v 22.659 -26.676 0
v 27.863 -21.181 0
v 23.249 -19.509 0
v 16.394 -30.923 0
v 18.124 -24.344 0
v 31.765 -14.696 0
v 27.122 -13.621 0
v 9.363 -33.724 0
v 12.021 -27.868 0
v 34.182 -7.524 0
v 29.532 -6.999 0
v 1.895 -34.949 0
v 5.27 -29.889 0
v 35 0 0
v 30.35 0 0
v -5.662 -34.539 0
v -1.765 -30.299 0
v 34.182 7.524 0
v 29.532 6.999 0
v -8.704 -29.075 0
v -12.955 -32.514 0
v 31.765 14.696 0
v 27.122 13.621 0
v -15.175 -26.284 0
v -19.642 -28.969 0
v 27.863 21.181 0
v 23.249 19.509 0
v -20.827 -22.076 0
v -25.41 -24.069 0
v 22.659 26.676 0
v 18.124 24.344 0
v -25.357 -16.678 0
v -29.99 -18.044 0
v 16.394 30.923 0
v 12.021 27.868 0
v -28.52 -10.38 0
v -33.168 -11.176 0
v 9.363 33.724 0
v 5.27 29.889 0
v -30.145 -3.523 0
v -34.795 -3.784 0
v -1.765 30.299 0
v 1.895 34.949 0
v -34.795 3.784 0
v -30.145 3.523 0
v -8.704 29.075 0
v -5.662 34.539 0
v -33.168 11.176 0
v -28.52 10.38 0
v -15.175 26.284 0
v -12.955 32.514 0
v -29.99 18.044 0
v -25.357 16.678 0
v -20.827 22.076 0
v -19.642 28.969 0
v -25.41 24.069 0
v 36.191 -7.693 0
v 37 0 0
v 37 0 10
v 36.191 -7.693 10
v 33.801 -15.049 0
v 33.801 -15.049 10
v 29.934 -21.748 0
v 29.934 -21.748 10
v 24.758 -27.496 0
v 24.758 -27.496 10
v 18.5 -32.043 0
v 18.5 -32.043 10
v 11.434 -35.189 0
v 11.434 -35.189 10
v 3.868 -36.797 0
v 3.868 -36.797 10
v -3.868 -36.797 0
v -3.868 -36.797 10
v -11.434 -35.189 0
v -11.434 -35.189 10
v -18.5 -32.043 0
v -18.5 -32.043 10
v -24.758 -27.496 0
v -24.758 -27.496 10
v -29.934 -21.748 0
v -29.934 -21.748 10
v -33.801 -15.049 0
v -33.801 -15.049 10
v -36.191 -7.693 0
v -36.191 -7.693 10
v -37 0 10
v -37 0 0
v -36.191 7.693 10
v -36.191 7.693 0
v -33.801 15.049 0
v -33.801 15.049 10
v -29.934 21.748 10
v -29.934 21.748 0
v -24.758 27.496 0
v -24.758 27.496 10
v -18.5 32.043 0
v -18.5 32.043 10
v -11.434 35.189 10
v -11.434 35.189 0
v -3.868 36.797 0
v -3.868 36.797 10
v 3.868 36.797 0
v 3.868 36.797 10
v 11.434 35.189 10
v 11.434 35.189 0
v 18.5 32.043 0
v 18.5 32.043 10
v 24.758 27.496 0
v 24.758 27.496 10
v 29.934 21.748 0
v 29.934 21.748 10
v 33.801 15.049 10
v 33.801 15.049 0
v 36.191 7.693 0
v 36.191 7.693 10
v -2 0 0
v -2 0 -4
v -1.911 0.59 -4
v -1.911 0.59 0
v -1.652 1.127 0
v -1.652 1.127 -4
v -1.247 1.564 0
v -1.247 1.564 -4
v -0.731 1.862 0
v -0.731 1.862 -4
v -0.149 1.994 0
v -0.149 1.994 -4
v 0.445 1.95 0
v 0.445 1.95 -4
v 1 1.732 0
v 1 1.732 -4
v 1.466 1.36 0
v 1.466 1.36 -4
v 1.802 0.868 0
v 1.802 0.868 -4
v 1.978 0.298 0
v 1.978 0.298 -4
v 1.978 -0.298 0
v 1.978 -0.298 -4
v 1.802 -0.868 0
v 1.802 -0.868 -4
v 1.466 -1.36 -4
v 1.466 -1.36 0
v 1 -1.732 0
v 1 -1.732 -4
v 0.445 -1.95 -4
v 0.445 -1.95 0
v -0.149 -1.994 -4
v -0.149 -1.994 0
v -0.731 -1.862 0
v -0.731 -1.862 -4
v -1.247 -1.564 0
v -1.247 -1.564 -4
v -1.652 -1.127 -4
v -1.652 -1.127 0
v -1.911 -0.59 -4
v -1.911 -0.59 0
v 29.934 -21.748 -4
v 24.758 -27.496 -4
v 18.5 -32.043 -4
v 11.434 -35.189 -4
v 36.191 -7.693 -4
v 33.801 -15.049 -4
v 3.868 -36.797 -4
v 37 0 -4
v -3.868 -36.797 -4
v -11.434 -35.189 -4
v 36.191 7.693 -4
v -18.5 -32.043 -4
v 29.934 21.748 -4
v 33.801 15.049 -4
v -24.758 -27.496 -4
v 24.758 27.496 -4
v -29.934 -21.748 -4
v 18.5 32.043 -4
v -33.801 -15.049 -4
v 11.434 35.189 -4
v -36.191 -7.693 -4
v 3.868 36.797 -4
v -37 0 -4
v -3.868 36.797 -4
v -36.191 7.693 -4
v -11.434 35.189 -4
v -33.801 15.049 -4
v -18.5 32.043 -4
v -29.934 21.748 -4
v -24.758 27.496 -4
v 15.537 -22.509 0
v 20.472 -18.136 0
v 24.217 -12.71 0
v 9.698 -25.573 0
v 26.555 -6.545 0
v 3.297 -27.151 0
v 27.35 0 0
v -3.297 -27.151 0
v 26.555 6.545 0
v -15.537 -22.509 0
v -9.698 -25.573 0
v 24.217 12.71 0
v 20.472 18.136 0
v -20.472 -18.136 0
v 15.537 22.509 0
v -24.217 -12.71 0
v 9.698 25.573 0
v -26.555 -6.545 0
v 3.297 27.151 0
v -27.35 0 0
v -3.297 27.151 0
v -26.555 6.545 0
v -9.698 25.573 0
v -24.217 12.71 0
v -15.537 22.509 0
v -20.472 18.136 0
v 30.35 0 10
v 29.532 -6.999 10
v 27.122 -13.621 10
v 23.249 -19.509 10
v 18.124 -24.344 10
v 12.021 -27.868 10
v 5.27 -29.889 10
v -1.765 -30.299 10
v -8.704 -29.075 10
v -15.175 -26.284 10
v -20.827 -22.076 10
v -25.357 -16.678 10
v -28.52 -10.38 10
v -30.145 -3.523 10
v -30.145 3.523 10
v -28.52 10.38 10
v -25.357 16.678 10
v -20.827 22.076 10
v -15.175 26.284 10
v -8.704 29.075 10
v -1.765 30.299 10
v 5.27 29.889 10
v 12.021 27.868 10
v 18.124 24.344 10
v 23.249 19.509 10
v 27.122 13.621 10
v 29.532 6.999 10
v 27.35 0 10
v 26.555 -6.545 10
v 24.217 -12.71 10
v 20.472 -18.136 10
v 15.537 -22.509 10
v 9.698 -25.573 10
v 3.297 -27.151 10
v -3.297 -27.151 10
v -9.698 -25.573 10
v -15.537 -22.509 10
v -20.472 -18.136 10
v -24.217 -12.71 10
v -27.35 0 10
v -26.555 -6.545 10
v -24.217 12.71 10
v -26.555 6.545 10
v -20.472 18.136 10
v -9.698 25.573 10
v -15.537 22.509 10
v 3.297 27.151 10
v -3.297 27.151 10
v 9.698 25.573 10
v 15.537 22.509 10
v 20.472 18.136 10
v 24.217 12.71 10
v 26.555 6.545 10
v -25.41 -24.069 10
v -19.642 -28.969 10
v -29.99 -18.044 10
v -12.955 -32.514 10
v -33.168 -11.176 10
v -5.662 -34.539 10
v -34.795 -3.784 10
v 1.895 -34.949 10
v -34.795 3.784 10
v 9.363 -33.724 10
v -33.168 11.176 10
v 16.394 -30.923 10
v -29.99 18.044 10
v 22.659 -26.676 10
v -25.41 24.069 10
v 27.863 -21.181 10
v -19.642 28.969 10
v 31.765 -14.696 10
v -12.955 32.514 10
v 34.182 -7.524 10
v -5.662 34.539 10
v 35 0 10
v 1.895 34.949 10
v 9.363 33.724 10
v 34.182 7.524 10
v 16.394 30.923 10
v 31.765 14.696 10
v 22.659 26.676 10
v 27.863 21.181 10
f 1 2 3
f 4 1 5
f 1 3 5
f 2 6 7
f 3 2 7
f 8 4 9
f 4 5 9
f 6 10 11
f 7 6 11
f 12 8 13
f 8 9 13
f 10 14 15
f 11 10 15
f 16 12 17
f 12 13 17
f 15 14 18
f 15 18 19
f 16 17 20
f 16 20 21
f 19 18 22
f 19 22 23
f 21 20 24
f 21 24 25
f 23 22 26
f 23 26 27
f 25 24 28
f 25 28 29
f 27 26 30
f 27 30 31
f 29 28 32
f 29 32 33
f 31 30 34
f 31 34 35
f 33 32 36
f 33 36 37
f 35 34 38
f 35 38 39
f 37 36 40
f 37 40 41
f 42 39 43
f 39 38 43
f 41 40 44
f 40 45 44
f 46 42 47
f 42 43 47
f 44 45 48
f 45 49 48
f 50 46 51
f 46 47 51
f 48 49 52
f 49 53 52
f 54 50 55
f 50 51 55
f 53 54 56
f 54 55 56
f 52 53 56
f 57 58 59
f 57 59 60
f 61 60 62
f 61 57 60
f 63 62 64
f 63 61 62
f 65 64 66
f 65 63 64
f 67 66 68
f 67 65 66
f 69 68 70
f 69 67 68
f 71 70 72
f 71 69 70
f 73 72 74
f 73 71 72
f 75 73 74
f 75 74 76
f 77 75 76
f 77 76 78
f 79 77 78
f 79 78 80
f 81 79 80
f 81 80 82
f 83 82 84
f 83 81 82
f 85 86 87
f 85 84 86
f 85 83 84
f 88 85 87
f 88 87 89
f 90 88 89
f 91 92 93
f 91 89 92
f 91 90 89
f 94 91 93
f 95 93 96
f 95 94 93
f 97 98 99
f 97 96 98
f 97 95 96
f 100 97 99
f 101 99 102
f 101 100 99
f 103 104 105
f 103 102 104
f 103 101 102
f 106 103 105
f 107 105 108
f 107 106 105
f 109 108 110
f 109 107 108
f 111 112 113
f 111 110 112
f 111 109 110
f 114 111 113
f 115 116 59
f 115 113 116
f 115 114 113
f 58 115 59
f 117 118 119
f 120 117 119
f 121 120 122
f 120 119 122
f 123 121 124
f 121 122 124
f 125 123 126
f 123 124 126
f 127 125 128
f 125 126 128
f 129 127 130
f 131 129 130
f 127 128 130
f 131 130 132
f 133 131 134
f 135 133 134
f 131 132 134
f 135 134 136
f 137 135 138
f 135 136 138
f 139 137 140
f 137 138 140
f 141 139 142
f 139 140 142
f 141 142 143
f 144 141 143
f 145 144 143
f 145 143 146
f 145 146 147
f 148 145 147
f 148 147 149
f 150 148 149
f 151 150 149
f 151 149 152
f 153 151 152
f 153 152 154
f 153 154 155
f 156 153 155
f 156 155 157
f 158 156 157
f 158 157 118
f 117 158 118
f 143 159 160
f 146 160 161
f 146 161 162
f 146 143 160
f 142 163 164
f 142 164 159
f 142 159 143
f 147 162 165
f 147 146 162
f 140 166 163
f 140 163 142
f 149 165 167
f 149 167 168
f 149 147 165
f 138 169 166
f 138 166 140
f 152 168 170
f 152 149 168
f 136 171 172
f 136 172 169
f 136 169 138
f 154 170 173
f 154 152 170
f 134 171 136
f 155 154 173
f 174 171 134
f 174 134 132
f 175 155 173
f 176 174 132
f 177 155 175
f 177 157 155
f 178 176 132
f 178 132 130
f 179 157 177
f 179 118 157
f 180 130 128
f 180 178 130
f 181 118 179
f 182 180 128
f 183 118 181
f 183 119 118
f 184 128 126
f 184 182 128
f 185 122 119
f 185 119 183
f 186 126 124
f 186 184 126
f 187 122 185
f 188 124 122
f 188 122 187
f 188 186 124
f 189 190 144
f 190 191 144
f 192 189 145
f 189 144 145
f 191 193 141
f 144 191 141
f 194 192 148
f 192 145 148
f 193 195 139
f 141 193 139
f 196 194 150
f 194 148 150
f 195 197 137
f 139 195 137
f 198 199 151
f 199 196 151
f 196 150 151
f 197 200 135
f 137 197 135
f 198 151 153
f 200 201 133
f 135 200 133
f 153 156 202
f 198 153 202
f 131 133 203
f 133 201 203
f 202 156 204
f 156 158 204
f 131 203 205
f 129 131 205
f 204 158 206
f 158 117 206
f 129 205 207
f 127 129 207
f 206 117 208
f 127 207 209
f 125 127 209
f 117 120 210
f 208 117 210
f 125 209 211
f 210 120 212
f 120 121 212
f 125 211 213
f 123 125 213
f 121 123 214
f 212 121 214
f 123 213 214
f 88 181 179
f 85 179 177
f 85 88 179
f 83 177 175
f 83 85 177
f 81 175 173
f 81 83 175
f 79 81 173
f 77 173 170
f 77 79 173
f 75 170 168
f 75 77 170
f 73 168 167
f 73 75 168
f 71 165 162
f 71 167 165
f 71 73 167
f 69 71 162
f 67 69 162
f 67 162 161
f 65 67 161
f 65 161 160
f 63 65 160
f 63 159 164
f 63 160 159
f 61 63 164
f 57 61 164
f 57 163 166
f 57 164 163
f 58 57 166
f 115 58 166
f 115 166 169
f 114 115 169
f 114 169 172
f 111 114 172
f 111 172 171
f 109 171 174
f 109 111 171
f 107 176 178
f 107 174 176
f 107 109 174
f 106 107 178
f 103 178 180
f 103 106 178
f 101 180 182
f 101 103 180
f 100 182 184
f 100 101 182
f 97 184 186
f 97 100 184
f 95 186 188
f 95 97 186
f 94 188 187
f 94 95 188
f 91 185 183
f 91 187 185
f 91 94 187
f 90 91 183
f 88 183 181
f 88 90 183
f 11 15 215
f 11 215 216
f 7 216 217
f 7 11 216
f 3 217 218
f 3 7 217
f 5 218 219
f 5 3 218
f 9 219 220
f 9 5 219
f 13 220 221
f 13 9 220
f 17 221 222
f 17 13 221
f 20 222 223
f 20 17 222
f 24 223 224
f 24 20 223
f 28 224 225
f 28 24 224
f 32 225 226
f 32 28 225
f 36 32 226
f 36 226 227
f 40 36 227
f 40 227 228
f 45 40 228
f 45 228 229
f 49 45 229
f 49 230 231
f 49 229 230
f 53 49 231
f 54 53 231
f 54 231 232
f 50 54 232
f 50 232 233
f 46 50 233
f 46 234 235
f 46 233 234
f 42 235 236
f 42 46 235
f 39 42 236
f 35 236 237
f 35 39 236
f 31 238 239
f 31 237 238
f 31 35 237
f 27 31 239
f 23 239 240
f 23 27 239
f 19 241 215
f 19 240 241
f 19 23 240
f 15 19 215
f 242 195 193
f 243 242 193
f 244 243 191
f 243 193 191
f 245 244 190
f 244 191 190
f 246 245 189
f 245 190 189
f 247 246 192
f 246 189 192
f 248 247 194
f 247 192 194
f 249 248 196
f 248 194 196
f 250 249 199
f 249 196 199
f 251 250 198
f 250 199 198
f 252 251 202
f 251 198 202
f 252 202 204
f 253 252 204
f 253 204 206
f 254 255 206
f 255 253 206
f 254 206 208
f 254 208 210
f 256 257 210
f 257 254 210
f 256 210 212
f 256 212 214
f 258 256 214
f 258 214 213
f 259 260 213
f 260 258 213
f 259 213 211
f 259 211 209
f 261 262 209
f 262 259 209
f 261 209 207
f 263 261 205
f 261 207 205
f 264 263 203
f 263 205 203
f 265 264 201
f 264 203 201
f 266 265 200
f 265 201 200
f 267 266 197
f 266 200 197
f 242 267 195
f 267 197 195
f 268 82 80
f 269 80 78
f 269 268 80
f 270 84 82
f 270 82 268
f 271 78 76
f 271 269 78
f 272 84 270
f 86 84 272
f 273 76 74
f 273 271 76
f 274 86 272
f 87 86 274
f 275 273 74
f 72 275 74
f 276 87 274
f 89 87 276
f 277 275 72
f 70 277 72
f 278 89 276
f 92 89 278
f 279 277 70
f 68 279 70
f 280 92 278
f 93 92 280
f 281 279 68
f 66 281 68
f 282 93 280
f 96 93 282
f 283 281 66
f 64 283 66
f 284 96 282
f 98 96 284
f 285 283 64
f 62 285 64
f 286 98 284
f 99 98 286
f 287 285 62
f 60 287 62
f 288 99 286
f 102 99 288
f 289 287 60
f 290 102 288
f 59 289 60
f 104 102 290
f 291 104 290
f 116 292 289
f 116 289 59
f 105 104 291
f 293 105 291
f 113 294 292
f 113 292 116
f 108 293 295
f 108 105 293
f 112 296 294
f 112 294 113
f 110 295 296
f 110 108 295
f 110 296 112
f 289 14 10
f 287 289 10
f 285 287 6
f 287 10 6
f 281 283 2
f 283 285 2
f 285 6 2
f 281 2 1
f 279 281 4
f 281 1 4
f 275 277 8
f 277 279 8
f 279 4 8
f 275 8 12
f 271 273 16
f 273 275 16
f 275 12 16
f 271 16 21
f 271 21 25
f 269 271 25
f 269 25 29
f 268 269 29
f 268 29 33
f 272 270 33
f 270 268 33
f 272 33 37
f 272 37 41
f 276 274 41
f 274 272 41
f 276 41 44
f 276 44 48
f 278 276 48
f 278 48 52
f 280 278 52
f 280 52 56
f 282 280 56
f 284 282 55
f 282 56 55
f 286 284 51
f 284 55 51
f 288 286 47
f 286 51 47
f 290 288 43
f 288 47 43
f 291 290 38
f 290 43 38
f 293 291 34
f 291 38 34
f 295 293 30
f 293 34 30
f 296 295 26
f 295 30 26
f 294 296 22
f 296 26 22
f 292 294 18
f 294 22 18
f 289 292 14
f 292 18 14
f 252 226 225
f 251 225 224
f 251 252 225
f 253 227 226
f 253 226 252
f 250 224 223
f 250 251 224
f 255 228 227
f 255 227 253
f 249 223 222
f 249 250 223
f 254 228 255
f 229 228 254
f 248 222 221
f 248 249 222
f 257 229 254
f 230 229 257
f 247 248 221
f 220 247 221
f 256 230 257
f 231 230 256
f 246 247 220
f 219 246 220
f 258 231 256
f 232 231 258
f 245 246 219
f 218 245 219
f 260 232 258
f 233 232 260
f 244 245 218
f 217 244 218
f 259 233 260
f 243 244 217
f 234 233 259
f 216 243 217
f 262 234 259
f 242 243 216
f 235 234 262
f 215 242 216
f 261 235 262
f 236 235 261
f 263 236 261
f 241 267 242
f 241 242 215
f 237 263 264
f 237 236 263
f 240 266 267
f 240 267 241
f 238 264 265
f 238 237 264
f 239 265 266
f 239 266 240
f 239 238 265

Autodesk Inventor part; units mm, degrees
ref_plane "YZ Plane" through (0, 0, 0) normal (1, 0, 0) x (0, 1, 0)
ref_plane "XZ Plane" through (0, 0, 0) normal (0, 1, 0) x (-1, 0, 0)
ref_plane "XY Plane" through (0, 0, 0) normal (0, 0, 1) x (1, 0, 0)
sketch "Boceto1" plane through (0, 0, 0) normal (0, 0, 1) x (1, 0, 0)
  circle A0 centre (0, 0) radius 30.35
  circle A1 centre (0, 0) radius 35
  circle A2 centre (0, 0) radius 27.35
  circle A3 centre (0, 0) radius 37
  dimension "d0" = 60.7
  dimension "d1" = 70
  dimension "d2" = 3
  dimension "d3" = 2
extrude "Extrusión1" add sketch "Boceto1" along normal blind 10
sketch "Boceto2" plane through (0, 0, 0) normal (0, 0, -1) x (-1, 0, 0)
  circle A0 centre (0, 0) radius 30.35
  circle A1 centre (0, 0) radius 35
  circle A2 centre (0, 0) radius 37
extrude "Extrusión2" add sketch "Boceto2" along normal blind 4 contours A0 | A1 | A2
sketch "Boceto3" plane through (0, 0, -4) normal (0, 0, -1) x (-1, 0, 0)
  circle A0 centre (0, 0) radius 2
  dimension "d8" = 4
extrude "Extrusión3" cut sketch "Boceto3" against normal blind 4
properties part number "base_estable_soporte_3DPrint"
